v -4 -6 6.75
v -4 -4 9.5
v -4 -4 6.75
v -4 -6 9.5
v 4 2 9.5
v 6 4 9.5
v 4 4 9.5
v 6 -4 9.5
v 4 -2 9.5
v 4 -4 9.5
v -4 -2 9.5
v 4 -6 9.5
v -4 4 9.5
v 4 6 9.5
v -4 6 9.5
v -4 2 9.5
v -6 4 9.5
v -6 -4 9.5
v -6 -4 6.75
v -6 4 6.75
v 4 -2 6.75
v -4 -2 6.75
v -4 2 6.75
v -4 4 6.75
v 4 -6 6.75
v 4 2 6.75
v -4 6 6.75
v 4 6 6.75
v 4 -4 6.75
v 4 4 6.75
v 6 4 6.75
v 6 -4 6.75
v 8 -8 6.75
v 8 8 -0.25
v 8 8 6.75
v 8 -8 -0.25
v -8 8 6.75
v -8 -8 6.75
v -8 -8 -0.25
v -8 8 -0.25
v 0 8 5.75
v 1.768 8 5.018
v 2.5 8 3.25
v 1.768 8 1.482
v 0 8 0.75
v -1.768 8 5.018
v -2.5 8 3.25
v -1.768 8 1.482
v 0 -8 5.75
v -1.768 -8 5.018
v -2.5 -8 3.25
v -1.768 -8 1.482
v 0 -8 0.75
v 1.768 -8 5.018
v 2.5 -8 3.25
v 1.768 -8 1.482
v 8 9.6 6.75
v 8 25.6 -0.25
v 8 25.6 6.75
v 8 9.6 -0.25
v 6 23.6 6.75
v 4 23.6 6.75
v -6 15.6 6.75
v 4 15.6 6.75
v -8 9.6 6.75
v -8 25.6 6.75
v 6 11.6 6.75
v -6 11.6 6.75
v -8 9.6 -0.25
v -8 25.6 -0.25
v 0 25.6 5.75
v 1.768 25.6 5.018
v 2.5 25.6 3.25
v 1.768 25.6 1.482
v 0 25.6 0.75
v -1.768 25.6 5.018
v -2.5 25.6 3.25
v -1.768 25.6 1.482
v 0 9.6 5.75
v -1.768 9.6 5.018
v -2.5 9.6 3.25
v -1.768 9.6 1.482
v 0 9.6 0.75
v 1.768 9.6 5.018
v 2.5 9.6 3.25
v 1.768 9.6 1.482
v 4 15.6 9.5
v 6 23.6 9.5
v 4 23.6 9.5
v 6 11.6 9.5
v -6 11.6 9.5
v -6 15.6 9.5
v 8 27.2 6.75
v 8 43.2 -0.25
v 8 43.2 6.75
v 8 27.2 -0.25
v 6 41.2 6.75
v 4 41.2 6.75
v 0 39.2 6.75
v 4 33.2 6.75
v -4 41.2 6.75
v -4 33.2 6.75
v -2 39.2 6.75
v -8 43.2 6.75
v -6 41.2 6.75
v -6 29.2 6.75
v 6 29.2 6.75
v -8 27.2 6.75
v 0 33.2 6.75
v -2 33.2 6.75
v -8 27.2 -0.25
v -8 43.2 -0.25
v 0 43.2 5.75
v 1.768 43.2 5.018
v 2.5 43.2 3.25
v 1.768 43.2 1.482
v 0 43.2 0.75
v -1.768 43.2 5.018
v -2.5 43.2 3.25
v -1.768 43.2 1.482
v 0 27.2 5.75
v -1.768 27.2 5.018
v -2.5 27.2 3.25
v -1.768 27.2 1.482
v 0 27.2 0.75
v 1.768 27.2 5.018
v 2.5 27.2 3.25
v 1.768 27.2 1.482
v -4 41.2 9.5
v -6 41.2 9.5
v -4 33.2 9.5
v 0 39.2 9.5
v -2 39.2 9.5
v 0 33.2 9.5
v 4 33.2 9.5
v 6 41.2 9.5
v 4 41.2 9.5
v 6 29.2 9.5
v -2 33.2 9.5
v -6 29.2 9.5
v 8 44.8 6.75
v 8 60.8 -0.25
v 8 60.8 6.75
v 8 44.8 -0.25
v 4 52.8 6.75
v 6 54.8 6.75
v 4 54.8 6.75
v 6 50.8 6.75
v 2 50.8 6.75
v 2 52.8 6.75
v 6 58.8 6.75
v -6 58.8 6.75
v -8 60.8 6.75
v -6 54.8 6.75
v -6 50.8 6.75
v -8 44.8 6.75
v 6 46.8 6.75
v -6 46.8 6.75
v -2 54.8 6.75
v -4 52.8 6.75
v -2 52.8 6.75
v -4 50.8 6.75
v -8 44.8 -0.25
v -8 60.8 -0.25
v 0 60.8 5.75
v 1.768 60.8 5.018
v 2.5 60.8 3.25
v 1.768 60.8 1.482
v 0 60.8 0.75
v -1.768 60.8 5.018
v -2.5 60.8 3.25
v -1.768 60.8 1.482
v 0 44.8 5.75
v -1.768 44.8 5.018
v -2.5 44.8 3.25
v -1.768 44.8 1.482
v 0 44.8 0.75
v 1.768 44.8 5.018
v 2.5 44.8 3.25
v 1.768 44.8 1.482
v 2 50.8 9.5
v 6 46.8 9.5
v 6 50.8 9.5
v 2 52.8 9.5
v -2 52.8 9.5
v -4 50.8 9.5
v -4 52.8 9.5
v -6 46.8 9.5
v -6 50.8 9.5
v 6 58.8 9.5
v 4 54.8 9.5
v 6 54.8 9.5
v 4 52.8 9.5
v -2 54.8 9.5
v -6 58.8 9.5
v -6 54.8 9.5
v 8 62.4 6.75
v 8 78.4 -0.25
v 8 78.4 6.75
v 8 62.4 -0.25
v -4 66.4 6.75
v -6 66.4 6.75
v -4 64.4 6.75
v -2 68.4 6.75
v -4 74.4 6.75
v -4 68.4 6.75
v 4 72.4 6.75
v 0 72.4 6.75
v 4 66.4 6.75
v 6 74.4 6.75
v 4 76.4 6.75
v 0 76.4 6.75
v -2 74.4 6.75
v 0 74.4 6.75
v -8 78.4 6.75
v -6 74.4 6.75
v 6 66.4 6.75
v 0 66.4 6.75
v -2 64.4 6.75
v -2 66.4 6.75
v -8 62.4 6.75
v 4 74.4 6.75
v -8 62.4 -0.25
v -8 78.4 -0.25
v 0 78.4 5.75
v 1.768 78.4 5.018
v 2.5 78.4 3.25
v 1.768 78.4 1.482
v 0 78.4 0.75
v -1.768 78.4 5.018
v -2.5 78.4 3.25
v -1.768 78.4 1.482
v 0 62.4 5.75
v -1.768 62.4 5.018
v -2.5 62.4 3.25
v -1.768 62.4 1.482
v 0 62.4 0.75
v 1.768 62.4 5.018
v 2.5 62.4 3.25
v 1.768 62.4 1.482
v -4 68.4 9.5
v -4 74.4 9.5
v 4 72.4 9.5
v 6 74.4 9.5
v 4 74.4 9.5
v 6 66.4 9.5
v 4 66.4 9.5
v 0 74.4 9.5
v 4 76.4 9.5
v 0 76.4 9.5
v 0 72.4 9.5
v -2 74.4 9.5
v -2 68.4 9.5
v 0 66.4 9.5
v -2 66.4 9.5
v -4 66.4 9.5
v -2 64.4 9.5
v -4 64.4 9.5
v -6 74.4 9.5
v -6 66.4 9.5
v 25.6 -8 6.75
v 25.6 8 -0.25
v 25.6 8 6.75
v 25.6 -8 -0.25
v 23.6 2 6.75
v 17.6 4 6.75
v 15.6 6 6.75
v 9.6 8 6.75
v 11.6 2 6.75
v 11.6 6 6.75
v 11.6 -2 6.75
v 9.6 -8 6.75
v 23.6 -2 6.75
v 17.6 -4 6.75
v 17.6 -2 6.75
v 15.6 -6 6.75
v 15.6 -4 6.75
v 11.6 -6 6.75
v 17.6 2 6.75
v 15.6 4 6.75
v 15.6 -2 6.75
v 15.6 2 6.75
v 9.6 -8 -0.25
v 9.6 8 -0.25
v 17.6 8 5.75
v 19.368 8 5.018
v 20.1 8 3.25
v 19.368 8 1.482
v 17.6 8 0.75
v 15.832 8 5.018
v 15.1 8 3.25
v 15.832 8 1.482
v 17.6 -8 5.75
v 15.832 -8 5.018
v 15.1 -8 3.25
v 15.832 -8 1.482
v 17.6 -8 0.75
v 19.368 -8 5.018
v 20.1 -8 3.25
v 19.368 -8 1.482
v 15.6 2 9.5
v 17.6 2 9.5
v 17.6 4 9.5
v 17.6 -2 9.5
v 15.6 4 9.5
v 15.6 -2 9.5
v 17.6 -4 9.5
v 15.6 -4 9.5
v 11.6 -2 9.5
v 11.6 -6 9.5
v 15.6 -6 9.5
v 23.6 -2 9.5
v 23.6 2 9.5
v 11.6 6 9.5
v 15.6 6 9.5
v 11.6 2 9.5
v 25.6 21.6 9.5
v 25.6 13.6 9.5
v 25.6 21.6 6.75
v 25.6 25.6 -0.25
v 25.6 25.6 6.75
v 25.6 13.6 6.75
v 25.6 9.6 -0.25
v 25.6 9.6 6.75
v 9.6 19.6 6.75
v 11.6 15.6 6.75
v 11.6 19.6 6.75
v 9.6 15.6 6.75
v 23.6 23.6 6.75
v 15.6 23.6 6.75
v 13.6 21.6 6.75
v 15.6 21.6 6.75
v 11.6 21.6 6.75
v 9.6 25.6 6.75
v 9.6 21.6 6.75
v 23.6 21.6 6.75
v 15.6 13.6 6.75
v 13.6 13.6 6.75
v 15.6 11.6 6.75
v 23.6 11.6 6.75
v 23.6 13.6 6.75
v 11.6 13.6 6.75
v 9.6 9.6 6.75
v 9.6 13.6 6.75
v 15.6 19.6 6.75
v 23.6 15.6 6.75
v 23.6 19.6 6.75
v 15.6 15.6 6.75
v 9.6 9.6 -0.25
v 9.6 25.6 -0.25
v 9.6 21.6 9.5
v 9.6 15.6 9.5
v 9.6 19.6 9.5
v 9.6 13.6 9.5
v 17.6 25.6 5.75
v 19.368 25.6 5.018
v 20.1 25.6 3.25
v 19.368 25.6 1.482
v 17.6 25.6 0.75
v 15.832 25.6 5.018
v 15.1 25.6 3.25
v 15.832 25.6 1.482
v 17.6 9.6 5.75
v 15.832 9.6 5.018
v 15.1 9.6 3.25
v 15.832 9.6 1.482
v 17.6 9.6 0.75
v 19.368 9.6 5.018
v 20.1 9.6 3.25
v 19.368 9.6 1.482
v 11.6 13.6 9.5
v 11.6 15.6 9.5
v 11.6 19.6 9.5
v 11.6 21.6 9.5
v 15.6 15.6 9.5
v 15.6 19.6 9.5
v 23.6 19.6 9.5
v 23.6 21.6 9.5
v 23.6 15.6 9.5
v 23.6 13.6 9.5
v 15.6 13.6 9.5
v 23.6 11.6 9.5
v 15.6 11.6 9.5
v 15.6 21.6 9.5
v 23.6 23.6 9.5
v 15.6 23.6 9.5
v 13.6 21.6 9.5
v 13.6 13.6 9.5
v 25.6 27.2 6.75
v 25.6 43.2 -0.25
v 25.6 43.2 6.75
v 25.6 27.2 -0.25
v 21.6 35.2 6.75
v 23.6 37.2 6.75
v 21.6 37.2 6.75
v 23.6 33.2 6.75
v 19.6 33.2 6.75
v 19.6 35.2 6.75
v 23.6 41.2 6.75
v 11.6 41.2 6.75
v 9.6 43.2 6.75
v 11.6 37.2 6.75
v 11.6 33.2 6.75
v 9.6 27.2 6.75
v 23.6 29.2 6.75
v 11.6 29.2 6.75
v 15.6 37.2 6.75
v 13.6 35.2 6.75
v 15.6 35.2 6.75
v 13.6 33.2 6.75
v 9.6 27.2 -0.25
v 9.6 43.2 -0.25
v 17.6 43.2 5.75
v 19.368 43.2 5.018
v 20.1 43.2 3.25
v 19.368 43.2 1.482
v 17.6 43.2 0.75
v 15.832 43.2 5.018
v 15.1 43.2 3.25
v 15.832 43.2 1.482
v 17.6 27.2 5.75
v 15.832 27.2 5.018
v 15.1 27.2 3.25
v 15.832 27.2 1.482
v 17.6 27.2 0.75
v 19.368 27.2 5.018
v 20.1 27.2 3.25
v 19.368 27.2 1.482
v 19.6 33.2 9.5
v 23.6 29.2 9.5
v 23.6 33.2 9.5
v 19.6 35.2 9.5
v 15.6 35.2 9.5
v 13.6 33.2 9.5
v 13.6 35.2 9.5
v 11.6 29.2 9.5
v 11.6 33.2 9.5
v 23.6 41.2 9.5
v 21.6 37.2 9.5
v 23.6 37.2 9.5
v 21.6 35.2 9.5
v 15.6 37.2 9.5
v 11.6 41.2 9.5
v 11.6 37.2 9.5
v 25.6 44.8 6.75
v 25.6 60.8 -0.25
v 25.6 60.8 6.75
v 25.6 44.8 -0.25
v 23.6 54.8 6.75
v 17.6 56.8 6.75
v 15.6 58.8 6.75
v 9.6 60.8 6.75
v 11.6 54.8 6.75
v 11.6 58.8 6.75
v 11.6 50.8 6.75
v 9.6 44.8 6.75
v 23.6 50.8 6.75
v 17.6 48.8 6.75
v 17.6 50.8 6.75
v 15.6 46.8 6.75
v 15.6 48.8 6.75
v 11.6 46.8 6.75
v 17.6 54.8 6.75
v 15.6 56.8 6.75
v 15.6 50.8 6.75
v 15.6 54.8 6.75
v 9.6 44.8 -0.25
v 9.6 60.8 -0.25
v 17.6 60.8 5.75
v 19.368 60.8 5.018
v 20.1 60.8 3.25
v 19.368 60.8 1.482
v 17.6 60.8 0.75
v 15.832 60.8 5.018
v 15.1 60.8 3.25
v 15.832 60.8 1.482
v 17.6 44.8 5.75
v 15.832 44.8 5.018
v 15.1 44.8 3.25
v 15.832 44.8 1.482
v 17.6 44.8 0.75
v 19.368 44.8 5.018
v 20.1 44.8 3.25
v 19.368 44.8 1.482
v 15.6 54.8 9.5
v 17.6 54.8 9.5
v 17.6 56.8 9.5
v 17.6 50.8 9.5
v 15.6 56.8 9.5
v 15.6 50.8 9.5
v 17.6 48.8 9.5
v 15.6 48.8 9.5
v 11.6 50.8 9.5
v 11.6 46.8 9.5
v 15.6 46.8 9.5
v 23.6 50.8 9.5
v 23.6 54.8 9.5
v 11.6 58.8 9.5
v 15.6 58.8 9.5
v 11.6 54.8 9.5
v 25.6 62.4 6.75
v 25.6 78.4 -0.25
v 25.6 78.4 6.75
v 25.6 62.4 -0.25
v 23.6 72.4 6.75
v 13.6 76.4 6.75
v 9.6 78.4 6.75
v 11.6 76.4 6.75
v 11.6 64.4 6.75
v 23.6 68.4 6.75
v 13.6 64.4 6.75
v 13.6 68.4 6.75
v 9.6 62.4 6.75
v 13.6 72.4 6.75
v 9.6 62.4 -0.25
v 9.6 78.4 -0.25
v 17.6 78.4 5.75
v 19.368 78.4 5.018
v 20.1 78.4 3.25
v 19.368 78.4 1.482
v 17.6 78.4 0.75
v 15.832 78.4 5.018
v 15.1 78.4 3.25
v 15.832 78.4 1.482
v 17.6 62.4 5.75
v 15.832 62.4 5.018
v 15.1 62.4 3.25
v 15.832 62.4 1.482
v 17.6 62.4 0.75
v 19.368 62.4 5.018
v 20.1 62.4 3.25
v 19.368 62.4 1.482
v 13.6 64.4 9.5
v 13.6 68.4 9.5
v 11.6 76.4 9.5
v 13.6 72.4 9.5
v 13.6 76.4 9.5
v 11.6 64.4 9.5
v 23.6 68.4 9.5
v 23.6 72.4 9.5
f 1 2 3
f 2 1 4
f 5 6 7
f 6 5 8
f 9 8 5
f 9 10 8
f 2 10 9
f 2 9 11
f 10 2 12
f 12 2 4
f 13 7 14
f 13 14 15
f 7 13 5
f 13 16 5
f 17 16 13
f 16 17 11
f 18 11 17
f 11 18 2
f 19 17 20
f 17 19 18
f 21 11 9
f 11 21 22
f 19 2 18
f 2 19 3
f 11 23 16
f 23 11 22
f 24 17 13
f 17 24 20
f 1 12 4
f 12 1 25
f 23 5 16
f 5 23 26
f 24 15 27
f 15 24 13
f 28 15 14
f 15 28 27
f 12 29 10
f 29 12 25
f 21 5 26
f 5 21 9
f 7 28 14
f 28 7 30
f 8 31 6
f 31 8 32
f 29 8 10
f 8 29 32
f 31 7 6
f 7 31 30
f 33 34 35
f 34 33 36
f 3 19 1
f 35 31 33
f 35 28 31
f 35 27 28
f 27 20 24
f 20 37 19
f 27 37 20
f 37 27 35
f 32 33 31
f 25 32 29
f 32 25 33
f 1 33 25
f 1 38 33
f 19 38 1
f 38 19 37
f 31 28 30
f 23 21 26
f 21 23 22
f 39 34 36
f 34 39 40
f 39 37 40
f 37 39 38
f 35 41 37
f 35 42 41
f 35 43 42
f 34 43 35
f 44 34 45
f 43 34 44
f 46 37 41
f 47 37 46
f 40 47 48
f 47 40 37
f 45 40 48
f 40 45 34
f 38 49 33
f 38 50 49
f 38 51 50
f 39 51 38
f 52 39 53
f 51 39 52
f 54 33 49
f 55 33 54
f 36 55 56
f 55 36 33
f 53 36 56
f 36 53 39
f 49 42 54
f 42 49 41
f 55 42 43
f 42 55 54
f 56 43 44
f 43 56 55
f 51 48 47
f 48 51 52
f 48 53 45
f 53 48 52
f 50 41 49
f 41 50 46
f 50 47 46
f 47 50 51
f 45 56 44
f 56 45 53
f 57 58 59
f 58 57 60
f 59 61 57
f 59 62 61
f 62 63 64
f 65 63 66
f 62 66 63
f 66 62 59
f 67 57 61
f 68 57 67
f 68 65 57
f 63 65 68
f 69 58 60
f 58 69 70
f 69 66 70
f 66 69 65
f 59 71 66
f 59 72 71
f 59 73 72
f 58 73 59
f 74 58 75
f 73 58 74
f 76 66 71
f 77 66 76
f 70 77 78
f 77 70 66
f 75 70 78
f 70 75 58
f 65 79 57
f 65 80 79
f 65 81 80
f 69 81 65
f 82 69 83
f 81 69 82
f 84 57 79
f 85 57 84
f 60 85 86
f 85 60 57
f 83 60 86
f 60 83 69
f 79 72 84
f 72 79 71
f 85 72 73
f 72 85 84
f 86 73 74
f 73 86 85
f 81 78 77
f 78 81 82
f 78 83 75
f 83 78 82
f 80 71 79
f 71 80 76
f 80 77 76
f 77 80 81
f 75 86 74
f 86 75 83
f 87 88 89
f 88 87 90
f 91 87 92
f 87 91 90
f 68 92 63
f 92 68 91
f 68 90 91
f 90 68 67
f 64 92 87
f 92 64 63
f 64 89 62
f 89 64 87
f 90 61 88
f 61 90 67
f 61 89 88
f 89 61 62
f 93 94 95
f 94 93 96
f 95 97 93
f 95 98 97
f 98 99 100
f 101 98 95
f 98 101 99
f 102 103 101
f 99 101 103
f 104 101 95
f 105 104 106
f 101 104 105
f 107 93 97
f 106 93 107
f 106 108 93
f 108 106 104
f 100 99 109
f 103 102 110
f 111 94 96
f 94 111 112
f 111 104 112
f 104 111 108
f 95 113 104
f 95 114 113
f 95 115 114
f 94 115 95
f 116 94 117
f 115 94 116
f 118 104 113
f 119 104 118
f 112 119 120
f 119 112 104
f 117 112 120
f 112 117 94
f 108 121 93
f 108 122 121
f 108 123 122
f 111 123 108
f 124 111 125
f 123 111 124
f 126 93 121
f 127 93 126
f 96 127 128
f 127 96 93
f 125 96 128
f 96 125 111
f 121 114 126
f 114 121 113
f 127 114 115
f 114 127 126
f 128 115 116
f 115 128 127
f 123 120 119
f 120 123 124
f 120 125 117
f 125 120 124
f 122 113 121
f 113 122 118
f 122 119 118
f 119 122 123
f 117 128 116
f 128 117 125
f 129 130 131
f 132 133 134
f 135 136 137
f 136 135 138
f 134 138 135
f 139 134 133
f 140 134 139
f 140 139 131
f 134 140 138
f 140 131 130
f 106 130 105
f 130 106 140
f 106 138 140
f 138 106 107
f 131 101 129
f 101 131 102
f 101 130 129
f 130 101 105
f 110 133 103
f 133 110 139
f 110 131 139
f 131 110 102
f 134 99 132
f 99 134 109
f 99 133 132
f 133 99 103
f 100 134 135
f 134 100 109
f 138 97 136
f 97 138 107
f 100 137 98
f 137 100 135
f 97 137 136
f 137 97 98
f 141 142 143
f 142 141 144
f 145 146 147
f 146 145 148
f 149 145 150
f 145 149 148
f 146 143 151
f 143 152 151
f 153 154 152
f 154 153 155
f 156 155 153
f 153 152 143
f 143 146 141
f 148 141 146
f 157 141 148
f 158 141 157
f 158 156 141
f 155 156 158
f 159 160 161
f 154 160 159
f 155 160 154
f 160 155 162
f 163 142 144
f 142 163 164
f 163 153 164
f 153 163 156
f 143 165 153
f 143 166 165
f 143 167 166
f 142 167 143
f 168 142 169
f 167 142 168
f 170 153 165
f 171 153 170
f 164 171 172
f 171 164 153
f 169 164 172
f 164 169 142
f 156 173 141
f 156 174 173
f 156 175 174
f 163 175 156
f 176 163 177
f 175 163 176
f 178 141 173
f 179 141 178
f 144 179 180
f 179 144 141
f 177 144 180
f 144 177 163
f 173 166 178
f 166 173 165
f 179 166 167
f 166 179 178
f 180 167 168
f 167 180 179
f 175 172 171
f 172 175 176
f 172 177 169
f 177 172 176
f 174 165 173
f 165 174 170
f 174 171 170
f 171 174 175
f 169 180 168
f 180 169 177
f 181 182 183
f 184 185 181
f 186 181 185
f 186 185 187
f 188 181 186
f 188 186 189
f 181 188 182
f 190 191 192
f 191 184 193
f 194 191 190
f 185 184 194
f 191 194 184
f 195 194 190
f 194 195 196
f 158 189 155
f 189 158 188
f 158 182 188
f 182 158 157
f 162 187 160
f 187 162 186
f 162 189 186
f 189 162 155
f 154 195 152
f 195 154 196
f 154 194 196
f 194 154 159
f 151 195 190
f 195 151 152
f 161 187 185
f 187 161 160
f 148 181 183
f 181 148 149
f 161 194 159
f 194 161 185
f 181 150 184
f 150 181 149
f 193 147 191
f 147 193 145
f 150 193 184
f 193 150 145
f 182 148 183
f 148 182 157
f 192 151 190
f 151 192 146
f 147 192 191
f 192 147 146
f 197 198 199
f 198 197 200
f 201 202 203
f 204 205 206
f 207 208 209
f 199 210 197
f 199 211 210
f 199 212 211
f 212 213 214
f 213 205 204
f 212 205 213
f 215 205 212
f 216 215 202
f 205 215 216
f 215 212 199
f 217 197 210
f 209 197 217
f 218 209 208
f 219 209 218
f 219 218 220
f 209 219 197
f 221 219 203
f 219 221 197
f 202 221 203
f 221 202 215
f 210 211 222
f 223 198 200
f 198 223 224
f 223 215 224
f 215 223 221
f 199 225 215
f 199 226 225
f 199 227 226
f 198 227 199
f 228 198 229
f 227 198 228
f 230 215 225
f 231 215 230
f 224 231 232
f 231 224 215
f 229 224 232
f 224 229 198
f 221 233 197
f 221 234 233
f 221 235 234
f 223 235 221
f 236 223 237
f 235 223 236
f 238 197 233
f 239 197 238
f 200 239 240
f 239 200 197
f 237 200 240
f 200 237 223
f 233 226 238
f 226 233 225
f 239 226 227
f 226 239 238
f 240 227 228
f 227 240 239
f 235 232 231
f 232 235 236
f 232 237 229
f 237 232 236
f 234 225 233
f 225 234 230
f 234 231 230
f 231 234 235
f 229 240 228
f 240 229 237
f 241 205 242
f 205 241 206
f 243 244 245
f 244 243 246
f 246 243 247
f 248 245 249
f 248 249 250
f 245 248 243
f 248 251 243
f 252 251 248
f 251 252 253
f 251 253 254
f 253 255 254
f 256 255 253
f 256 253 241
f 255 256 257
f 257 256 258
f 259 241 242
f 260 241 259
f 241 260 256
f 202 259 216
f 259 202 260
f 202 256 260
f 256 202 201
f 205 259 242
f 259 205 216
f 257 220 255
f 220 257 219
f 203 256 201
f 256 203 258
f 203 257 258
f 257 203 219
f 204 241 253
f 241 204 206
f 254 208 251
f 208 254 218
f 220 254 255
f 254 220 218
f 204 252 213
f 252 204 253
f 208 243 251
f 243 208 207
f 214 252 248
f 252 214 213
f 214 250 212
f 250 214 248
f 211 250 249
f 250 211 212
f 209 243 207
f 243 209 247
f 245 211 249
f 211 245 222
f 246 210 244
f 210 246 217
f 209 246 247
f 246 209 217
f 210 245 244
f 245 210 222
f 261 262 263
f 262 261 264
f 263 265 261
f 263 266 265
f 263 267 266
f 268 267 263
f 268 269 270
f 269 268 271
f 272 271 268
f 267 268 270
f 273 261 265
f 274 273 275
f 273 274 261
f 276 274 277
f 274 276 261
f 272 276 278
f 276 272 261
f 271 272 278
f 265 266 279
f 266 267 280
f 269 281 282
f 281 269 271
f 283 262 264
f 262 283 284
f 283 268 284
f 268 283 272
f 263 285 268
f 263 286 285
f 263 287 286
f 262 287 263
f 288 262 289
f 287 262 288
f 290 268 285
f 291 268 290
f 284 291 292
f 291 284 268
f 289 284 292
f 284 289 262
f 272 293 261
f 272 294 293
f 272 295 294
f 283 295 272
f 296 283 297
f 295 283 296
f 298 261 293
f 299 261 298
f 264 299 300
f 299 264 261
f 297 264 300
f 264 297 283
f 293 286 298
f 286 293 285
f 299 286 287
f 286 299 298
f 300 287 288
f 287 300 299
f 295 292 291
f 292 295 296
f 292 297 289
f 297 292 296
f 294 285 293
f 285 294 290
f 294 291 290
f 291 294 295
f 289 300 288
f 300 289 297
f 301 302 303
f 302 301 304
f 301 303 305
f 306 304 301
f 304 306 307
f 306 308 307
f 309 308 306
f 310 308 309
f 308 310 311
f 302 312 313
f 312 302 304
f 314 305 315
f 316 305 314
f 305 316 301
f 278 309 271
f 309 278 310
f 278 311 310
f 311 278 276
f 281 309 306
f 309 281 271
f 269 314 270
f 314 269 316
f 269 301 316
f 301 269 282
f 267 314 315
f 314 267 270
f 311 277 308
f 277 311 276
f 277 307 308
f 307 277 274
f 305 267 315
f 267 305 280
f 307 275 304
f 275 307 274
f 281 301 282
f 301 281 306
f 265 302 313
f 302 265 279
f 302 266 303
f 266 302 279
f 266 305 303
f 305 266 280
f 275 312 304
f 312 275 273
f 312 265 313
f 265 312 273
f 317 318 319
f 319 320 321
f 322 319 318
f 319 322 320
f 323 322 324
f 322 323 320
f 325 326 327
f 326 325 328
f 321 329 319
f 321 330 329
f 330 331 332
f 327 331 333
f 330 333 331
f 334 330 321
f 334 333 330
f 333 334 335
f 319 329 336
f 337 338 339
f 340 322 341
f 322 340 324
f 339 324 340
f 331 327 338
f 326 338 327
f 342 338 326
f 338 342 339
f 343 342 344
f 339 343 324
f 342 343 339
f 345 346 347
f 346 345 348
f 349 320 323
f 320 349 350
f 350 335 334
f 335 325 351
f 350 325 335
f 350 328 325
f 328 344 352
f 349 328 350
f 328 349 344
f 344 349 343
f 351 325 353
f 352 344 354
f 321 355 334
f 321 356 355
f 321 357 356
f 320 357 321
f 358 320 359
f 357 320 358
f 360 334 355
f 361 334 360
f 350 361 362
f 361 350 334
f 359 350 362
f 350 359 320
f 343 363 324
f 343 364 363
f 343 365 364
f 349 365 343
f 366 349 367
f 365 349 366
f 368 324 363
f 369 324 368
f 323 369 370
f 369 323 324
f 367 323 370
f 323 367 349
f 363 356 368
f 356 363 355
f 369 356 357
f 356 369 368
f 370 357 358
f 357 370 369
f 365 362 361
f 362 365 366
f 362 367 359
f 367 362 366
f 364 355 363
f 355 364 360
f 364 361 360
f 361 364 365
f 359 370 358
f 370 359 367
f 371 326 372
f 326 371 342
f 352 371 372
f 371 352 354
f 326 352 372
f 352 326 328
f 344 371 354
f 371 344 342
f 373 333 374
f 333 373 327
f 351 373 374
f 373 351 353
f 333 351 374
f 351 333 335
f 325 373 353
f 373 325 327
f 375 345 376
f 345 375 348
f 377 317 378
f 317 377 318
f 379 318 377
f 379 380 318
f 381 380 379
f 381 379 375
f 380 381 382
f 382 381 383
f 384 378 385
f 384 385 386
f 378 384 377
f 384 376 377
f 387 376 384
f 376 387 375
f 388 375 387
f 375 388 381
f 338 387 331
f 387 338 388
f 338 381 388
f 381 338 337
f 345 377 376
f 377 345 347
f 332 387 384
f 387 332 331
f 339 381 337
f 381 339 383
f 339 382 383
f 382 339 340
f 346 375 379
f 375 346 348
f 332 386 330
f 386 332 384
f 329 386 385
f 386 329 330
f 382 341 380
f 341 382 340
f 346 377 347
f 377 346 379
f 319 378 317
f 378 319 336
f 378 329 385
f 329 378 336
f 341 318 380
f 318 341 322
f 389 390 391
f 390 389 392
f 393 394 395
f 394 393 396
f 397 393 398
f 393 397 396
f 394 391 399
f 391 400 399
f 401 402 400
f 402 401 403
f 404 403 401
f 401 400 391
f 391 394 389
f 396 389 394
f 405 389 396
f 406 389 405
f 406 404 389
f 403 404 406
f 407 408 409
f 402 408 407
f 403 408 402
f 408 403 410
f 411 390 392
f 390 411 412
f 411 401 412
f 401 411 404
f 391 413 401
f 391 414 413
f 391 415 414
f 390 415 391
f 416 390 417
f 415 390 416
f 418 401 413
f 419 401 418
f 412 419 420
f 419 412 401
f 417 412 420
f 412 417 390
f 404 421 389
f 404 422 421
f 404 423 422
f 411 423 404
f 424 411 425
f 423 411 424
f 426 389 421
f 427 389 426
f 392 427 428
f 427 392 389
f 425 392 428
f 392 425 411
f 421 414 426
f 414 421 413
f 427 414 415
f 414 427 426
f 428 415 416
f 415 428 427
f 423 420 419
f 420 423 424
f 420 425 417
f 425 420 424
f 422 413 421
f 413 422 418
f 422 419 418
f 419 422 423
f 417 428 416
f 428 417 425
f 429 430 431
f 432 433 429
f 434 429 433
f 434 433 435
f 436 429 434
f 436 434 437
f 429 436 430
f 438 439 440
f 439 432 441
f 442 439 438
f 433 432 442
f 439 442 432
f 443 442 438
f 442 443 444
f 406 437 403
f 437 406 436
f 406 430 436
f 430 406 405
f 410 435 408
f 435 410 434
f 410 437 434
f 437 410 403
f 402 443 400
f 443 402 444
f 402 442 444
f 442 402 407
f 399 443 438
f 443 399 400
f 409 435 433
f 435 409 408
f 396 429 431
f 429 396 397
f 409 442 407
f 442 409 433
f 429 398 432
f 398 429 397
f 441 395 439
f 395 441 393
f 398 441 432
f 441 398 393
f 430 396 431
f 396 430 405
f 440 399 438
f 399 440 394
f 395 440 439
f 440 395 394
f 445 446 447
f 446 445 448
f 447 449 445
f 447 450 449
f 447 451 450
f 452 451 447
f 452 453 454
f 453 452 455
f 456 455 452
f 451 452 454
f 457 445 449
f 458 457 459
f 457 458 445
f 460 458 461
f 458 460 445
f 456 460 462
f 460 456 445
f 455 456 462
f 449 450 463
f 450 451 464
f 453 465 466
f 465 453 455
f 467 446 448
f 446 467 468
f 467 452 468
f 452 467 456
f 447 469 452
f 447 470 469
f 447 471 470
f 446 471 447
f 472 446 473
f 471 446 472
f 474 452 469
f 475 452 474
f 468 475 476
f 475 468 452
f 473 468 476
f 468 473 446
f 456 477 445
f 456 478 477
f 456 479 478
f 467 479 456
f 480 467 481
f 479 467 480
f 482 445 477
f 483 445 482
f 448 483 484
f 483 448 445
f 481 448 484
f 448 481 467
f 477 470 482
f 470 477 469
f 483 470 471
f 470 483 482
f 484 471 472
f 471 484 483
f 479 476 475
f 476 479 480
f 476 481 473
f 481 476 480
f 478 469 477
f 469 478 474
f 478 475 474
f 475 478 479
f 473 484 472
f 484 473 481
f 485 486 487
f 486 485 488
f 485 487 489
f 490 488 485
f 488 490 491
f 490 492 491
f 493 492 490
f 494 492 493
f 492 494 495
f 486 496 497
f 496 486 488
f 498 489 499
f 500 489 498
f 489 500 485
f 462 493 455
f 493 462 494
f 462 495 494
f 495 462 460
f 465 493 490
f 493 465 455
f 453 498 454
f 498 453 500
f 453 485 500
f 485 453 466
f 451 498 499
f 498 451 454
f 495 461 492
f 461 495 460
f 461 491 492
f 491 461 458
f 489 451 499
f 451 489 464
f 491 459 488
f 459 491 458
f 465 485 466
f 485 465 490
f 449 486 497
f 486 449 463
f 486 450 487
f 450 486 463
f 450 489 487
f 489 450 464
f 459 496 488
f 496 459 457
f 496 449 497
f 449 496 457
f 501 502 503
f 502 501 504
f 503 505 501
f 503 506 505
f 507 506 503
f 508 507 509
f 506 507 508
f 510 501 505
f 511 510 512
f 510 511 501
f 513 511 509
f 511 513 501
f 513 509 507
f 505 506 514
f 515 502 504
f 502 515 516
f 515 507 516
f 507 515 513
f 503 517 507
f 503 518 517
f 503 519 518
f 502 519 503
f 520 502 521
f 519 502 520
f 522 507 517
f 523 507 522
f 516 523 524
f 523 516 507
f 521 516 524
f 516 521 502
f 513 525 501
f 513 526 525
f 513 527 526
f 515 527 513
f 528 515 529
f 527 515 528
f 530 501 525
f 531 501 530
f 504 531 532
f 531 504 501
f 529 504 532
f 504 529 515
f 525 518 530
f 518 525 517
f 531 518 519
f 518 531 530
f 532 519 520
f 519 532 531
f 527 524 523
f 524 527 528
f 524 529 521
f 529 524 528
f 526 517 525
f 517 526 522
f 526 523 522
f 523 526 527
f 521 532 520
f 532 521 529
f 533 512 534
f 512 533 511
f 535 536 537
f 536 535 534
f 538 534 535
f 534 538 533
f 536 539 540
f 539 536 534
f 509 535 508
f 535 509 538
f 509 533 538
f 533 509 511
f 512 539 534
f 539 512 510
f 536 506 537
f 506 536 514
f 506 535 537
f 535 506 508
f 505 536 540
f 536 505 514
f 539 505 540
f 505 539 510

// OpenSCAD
use <bitmap.scad>
/*
Parametric letters for for a necklace
Elmo Mäntynen <elmo.mantynen@iki.fi>
LGPL 2.1
*/

// change chars array and char_count
// OpenSCAD has no string or length methods :(
chars = [ "M", "a", "k", "e", "r", "B", "o", "t" ];
char_count = 8;

// block size 1 will result in 8mm per letter
block_size = 2;
// height is the Z height of each letter
height = 3;

// Hole for the necklace
hole_diameter = 5;

module 8bit_str(chars, char_count, block_size, height)
{
    echo(str("Total Width: ", block_size * 8 * char_count, "mm"));
    union()
    {
        for (count = [0:char_count - 1]) {
            translate(v = [ 0, count * block_size * 8, 0 ])
            {
                8bit_char(chars[count], block_size, height);
            }
        }
    }
}

module
letter(char, block_size, height, hole_diameter)
{
    union()
    {
        translate(v = [ 0, 0, hole_diameter * 1.3 ])
        {
            8bit_char(char, block_size, height);
        }
        translate(v = [ 0, 0, (hole_diameter * 1.3) / 2 ])
        {
            color([ 0, 0, 1, 1 ])
            {
                difference()
                {
                    cube(size =
                             [
                                 block_size * 8,
                                 block_size * 8,
                                 hole_diameter + 2
                             ],
                         center = true);
                    rotate([ 90, 0, 0 ]) cylinder(h = block_size * 8 + 1,
                                                  r = hole_diameter / 2,
                                                  center = true);
                }
            }
        }
    }
}

matrix = [ [ "O", "L", "E", "N", "S" ], [ "Y", "OE", "N", "Y", "T" ] ];

union()
{
    for (column = [0:1]) {
        for (row = [0:4]) {
            translate(v = [
                column * (block_size * 1.1) * 8,
                row * (block_size * 1.1) * 8,
                0
            ]) letter(matrix[column][row], block_size, height, hole_diameter);
        }
    }
}
